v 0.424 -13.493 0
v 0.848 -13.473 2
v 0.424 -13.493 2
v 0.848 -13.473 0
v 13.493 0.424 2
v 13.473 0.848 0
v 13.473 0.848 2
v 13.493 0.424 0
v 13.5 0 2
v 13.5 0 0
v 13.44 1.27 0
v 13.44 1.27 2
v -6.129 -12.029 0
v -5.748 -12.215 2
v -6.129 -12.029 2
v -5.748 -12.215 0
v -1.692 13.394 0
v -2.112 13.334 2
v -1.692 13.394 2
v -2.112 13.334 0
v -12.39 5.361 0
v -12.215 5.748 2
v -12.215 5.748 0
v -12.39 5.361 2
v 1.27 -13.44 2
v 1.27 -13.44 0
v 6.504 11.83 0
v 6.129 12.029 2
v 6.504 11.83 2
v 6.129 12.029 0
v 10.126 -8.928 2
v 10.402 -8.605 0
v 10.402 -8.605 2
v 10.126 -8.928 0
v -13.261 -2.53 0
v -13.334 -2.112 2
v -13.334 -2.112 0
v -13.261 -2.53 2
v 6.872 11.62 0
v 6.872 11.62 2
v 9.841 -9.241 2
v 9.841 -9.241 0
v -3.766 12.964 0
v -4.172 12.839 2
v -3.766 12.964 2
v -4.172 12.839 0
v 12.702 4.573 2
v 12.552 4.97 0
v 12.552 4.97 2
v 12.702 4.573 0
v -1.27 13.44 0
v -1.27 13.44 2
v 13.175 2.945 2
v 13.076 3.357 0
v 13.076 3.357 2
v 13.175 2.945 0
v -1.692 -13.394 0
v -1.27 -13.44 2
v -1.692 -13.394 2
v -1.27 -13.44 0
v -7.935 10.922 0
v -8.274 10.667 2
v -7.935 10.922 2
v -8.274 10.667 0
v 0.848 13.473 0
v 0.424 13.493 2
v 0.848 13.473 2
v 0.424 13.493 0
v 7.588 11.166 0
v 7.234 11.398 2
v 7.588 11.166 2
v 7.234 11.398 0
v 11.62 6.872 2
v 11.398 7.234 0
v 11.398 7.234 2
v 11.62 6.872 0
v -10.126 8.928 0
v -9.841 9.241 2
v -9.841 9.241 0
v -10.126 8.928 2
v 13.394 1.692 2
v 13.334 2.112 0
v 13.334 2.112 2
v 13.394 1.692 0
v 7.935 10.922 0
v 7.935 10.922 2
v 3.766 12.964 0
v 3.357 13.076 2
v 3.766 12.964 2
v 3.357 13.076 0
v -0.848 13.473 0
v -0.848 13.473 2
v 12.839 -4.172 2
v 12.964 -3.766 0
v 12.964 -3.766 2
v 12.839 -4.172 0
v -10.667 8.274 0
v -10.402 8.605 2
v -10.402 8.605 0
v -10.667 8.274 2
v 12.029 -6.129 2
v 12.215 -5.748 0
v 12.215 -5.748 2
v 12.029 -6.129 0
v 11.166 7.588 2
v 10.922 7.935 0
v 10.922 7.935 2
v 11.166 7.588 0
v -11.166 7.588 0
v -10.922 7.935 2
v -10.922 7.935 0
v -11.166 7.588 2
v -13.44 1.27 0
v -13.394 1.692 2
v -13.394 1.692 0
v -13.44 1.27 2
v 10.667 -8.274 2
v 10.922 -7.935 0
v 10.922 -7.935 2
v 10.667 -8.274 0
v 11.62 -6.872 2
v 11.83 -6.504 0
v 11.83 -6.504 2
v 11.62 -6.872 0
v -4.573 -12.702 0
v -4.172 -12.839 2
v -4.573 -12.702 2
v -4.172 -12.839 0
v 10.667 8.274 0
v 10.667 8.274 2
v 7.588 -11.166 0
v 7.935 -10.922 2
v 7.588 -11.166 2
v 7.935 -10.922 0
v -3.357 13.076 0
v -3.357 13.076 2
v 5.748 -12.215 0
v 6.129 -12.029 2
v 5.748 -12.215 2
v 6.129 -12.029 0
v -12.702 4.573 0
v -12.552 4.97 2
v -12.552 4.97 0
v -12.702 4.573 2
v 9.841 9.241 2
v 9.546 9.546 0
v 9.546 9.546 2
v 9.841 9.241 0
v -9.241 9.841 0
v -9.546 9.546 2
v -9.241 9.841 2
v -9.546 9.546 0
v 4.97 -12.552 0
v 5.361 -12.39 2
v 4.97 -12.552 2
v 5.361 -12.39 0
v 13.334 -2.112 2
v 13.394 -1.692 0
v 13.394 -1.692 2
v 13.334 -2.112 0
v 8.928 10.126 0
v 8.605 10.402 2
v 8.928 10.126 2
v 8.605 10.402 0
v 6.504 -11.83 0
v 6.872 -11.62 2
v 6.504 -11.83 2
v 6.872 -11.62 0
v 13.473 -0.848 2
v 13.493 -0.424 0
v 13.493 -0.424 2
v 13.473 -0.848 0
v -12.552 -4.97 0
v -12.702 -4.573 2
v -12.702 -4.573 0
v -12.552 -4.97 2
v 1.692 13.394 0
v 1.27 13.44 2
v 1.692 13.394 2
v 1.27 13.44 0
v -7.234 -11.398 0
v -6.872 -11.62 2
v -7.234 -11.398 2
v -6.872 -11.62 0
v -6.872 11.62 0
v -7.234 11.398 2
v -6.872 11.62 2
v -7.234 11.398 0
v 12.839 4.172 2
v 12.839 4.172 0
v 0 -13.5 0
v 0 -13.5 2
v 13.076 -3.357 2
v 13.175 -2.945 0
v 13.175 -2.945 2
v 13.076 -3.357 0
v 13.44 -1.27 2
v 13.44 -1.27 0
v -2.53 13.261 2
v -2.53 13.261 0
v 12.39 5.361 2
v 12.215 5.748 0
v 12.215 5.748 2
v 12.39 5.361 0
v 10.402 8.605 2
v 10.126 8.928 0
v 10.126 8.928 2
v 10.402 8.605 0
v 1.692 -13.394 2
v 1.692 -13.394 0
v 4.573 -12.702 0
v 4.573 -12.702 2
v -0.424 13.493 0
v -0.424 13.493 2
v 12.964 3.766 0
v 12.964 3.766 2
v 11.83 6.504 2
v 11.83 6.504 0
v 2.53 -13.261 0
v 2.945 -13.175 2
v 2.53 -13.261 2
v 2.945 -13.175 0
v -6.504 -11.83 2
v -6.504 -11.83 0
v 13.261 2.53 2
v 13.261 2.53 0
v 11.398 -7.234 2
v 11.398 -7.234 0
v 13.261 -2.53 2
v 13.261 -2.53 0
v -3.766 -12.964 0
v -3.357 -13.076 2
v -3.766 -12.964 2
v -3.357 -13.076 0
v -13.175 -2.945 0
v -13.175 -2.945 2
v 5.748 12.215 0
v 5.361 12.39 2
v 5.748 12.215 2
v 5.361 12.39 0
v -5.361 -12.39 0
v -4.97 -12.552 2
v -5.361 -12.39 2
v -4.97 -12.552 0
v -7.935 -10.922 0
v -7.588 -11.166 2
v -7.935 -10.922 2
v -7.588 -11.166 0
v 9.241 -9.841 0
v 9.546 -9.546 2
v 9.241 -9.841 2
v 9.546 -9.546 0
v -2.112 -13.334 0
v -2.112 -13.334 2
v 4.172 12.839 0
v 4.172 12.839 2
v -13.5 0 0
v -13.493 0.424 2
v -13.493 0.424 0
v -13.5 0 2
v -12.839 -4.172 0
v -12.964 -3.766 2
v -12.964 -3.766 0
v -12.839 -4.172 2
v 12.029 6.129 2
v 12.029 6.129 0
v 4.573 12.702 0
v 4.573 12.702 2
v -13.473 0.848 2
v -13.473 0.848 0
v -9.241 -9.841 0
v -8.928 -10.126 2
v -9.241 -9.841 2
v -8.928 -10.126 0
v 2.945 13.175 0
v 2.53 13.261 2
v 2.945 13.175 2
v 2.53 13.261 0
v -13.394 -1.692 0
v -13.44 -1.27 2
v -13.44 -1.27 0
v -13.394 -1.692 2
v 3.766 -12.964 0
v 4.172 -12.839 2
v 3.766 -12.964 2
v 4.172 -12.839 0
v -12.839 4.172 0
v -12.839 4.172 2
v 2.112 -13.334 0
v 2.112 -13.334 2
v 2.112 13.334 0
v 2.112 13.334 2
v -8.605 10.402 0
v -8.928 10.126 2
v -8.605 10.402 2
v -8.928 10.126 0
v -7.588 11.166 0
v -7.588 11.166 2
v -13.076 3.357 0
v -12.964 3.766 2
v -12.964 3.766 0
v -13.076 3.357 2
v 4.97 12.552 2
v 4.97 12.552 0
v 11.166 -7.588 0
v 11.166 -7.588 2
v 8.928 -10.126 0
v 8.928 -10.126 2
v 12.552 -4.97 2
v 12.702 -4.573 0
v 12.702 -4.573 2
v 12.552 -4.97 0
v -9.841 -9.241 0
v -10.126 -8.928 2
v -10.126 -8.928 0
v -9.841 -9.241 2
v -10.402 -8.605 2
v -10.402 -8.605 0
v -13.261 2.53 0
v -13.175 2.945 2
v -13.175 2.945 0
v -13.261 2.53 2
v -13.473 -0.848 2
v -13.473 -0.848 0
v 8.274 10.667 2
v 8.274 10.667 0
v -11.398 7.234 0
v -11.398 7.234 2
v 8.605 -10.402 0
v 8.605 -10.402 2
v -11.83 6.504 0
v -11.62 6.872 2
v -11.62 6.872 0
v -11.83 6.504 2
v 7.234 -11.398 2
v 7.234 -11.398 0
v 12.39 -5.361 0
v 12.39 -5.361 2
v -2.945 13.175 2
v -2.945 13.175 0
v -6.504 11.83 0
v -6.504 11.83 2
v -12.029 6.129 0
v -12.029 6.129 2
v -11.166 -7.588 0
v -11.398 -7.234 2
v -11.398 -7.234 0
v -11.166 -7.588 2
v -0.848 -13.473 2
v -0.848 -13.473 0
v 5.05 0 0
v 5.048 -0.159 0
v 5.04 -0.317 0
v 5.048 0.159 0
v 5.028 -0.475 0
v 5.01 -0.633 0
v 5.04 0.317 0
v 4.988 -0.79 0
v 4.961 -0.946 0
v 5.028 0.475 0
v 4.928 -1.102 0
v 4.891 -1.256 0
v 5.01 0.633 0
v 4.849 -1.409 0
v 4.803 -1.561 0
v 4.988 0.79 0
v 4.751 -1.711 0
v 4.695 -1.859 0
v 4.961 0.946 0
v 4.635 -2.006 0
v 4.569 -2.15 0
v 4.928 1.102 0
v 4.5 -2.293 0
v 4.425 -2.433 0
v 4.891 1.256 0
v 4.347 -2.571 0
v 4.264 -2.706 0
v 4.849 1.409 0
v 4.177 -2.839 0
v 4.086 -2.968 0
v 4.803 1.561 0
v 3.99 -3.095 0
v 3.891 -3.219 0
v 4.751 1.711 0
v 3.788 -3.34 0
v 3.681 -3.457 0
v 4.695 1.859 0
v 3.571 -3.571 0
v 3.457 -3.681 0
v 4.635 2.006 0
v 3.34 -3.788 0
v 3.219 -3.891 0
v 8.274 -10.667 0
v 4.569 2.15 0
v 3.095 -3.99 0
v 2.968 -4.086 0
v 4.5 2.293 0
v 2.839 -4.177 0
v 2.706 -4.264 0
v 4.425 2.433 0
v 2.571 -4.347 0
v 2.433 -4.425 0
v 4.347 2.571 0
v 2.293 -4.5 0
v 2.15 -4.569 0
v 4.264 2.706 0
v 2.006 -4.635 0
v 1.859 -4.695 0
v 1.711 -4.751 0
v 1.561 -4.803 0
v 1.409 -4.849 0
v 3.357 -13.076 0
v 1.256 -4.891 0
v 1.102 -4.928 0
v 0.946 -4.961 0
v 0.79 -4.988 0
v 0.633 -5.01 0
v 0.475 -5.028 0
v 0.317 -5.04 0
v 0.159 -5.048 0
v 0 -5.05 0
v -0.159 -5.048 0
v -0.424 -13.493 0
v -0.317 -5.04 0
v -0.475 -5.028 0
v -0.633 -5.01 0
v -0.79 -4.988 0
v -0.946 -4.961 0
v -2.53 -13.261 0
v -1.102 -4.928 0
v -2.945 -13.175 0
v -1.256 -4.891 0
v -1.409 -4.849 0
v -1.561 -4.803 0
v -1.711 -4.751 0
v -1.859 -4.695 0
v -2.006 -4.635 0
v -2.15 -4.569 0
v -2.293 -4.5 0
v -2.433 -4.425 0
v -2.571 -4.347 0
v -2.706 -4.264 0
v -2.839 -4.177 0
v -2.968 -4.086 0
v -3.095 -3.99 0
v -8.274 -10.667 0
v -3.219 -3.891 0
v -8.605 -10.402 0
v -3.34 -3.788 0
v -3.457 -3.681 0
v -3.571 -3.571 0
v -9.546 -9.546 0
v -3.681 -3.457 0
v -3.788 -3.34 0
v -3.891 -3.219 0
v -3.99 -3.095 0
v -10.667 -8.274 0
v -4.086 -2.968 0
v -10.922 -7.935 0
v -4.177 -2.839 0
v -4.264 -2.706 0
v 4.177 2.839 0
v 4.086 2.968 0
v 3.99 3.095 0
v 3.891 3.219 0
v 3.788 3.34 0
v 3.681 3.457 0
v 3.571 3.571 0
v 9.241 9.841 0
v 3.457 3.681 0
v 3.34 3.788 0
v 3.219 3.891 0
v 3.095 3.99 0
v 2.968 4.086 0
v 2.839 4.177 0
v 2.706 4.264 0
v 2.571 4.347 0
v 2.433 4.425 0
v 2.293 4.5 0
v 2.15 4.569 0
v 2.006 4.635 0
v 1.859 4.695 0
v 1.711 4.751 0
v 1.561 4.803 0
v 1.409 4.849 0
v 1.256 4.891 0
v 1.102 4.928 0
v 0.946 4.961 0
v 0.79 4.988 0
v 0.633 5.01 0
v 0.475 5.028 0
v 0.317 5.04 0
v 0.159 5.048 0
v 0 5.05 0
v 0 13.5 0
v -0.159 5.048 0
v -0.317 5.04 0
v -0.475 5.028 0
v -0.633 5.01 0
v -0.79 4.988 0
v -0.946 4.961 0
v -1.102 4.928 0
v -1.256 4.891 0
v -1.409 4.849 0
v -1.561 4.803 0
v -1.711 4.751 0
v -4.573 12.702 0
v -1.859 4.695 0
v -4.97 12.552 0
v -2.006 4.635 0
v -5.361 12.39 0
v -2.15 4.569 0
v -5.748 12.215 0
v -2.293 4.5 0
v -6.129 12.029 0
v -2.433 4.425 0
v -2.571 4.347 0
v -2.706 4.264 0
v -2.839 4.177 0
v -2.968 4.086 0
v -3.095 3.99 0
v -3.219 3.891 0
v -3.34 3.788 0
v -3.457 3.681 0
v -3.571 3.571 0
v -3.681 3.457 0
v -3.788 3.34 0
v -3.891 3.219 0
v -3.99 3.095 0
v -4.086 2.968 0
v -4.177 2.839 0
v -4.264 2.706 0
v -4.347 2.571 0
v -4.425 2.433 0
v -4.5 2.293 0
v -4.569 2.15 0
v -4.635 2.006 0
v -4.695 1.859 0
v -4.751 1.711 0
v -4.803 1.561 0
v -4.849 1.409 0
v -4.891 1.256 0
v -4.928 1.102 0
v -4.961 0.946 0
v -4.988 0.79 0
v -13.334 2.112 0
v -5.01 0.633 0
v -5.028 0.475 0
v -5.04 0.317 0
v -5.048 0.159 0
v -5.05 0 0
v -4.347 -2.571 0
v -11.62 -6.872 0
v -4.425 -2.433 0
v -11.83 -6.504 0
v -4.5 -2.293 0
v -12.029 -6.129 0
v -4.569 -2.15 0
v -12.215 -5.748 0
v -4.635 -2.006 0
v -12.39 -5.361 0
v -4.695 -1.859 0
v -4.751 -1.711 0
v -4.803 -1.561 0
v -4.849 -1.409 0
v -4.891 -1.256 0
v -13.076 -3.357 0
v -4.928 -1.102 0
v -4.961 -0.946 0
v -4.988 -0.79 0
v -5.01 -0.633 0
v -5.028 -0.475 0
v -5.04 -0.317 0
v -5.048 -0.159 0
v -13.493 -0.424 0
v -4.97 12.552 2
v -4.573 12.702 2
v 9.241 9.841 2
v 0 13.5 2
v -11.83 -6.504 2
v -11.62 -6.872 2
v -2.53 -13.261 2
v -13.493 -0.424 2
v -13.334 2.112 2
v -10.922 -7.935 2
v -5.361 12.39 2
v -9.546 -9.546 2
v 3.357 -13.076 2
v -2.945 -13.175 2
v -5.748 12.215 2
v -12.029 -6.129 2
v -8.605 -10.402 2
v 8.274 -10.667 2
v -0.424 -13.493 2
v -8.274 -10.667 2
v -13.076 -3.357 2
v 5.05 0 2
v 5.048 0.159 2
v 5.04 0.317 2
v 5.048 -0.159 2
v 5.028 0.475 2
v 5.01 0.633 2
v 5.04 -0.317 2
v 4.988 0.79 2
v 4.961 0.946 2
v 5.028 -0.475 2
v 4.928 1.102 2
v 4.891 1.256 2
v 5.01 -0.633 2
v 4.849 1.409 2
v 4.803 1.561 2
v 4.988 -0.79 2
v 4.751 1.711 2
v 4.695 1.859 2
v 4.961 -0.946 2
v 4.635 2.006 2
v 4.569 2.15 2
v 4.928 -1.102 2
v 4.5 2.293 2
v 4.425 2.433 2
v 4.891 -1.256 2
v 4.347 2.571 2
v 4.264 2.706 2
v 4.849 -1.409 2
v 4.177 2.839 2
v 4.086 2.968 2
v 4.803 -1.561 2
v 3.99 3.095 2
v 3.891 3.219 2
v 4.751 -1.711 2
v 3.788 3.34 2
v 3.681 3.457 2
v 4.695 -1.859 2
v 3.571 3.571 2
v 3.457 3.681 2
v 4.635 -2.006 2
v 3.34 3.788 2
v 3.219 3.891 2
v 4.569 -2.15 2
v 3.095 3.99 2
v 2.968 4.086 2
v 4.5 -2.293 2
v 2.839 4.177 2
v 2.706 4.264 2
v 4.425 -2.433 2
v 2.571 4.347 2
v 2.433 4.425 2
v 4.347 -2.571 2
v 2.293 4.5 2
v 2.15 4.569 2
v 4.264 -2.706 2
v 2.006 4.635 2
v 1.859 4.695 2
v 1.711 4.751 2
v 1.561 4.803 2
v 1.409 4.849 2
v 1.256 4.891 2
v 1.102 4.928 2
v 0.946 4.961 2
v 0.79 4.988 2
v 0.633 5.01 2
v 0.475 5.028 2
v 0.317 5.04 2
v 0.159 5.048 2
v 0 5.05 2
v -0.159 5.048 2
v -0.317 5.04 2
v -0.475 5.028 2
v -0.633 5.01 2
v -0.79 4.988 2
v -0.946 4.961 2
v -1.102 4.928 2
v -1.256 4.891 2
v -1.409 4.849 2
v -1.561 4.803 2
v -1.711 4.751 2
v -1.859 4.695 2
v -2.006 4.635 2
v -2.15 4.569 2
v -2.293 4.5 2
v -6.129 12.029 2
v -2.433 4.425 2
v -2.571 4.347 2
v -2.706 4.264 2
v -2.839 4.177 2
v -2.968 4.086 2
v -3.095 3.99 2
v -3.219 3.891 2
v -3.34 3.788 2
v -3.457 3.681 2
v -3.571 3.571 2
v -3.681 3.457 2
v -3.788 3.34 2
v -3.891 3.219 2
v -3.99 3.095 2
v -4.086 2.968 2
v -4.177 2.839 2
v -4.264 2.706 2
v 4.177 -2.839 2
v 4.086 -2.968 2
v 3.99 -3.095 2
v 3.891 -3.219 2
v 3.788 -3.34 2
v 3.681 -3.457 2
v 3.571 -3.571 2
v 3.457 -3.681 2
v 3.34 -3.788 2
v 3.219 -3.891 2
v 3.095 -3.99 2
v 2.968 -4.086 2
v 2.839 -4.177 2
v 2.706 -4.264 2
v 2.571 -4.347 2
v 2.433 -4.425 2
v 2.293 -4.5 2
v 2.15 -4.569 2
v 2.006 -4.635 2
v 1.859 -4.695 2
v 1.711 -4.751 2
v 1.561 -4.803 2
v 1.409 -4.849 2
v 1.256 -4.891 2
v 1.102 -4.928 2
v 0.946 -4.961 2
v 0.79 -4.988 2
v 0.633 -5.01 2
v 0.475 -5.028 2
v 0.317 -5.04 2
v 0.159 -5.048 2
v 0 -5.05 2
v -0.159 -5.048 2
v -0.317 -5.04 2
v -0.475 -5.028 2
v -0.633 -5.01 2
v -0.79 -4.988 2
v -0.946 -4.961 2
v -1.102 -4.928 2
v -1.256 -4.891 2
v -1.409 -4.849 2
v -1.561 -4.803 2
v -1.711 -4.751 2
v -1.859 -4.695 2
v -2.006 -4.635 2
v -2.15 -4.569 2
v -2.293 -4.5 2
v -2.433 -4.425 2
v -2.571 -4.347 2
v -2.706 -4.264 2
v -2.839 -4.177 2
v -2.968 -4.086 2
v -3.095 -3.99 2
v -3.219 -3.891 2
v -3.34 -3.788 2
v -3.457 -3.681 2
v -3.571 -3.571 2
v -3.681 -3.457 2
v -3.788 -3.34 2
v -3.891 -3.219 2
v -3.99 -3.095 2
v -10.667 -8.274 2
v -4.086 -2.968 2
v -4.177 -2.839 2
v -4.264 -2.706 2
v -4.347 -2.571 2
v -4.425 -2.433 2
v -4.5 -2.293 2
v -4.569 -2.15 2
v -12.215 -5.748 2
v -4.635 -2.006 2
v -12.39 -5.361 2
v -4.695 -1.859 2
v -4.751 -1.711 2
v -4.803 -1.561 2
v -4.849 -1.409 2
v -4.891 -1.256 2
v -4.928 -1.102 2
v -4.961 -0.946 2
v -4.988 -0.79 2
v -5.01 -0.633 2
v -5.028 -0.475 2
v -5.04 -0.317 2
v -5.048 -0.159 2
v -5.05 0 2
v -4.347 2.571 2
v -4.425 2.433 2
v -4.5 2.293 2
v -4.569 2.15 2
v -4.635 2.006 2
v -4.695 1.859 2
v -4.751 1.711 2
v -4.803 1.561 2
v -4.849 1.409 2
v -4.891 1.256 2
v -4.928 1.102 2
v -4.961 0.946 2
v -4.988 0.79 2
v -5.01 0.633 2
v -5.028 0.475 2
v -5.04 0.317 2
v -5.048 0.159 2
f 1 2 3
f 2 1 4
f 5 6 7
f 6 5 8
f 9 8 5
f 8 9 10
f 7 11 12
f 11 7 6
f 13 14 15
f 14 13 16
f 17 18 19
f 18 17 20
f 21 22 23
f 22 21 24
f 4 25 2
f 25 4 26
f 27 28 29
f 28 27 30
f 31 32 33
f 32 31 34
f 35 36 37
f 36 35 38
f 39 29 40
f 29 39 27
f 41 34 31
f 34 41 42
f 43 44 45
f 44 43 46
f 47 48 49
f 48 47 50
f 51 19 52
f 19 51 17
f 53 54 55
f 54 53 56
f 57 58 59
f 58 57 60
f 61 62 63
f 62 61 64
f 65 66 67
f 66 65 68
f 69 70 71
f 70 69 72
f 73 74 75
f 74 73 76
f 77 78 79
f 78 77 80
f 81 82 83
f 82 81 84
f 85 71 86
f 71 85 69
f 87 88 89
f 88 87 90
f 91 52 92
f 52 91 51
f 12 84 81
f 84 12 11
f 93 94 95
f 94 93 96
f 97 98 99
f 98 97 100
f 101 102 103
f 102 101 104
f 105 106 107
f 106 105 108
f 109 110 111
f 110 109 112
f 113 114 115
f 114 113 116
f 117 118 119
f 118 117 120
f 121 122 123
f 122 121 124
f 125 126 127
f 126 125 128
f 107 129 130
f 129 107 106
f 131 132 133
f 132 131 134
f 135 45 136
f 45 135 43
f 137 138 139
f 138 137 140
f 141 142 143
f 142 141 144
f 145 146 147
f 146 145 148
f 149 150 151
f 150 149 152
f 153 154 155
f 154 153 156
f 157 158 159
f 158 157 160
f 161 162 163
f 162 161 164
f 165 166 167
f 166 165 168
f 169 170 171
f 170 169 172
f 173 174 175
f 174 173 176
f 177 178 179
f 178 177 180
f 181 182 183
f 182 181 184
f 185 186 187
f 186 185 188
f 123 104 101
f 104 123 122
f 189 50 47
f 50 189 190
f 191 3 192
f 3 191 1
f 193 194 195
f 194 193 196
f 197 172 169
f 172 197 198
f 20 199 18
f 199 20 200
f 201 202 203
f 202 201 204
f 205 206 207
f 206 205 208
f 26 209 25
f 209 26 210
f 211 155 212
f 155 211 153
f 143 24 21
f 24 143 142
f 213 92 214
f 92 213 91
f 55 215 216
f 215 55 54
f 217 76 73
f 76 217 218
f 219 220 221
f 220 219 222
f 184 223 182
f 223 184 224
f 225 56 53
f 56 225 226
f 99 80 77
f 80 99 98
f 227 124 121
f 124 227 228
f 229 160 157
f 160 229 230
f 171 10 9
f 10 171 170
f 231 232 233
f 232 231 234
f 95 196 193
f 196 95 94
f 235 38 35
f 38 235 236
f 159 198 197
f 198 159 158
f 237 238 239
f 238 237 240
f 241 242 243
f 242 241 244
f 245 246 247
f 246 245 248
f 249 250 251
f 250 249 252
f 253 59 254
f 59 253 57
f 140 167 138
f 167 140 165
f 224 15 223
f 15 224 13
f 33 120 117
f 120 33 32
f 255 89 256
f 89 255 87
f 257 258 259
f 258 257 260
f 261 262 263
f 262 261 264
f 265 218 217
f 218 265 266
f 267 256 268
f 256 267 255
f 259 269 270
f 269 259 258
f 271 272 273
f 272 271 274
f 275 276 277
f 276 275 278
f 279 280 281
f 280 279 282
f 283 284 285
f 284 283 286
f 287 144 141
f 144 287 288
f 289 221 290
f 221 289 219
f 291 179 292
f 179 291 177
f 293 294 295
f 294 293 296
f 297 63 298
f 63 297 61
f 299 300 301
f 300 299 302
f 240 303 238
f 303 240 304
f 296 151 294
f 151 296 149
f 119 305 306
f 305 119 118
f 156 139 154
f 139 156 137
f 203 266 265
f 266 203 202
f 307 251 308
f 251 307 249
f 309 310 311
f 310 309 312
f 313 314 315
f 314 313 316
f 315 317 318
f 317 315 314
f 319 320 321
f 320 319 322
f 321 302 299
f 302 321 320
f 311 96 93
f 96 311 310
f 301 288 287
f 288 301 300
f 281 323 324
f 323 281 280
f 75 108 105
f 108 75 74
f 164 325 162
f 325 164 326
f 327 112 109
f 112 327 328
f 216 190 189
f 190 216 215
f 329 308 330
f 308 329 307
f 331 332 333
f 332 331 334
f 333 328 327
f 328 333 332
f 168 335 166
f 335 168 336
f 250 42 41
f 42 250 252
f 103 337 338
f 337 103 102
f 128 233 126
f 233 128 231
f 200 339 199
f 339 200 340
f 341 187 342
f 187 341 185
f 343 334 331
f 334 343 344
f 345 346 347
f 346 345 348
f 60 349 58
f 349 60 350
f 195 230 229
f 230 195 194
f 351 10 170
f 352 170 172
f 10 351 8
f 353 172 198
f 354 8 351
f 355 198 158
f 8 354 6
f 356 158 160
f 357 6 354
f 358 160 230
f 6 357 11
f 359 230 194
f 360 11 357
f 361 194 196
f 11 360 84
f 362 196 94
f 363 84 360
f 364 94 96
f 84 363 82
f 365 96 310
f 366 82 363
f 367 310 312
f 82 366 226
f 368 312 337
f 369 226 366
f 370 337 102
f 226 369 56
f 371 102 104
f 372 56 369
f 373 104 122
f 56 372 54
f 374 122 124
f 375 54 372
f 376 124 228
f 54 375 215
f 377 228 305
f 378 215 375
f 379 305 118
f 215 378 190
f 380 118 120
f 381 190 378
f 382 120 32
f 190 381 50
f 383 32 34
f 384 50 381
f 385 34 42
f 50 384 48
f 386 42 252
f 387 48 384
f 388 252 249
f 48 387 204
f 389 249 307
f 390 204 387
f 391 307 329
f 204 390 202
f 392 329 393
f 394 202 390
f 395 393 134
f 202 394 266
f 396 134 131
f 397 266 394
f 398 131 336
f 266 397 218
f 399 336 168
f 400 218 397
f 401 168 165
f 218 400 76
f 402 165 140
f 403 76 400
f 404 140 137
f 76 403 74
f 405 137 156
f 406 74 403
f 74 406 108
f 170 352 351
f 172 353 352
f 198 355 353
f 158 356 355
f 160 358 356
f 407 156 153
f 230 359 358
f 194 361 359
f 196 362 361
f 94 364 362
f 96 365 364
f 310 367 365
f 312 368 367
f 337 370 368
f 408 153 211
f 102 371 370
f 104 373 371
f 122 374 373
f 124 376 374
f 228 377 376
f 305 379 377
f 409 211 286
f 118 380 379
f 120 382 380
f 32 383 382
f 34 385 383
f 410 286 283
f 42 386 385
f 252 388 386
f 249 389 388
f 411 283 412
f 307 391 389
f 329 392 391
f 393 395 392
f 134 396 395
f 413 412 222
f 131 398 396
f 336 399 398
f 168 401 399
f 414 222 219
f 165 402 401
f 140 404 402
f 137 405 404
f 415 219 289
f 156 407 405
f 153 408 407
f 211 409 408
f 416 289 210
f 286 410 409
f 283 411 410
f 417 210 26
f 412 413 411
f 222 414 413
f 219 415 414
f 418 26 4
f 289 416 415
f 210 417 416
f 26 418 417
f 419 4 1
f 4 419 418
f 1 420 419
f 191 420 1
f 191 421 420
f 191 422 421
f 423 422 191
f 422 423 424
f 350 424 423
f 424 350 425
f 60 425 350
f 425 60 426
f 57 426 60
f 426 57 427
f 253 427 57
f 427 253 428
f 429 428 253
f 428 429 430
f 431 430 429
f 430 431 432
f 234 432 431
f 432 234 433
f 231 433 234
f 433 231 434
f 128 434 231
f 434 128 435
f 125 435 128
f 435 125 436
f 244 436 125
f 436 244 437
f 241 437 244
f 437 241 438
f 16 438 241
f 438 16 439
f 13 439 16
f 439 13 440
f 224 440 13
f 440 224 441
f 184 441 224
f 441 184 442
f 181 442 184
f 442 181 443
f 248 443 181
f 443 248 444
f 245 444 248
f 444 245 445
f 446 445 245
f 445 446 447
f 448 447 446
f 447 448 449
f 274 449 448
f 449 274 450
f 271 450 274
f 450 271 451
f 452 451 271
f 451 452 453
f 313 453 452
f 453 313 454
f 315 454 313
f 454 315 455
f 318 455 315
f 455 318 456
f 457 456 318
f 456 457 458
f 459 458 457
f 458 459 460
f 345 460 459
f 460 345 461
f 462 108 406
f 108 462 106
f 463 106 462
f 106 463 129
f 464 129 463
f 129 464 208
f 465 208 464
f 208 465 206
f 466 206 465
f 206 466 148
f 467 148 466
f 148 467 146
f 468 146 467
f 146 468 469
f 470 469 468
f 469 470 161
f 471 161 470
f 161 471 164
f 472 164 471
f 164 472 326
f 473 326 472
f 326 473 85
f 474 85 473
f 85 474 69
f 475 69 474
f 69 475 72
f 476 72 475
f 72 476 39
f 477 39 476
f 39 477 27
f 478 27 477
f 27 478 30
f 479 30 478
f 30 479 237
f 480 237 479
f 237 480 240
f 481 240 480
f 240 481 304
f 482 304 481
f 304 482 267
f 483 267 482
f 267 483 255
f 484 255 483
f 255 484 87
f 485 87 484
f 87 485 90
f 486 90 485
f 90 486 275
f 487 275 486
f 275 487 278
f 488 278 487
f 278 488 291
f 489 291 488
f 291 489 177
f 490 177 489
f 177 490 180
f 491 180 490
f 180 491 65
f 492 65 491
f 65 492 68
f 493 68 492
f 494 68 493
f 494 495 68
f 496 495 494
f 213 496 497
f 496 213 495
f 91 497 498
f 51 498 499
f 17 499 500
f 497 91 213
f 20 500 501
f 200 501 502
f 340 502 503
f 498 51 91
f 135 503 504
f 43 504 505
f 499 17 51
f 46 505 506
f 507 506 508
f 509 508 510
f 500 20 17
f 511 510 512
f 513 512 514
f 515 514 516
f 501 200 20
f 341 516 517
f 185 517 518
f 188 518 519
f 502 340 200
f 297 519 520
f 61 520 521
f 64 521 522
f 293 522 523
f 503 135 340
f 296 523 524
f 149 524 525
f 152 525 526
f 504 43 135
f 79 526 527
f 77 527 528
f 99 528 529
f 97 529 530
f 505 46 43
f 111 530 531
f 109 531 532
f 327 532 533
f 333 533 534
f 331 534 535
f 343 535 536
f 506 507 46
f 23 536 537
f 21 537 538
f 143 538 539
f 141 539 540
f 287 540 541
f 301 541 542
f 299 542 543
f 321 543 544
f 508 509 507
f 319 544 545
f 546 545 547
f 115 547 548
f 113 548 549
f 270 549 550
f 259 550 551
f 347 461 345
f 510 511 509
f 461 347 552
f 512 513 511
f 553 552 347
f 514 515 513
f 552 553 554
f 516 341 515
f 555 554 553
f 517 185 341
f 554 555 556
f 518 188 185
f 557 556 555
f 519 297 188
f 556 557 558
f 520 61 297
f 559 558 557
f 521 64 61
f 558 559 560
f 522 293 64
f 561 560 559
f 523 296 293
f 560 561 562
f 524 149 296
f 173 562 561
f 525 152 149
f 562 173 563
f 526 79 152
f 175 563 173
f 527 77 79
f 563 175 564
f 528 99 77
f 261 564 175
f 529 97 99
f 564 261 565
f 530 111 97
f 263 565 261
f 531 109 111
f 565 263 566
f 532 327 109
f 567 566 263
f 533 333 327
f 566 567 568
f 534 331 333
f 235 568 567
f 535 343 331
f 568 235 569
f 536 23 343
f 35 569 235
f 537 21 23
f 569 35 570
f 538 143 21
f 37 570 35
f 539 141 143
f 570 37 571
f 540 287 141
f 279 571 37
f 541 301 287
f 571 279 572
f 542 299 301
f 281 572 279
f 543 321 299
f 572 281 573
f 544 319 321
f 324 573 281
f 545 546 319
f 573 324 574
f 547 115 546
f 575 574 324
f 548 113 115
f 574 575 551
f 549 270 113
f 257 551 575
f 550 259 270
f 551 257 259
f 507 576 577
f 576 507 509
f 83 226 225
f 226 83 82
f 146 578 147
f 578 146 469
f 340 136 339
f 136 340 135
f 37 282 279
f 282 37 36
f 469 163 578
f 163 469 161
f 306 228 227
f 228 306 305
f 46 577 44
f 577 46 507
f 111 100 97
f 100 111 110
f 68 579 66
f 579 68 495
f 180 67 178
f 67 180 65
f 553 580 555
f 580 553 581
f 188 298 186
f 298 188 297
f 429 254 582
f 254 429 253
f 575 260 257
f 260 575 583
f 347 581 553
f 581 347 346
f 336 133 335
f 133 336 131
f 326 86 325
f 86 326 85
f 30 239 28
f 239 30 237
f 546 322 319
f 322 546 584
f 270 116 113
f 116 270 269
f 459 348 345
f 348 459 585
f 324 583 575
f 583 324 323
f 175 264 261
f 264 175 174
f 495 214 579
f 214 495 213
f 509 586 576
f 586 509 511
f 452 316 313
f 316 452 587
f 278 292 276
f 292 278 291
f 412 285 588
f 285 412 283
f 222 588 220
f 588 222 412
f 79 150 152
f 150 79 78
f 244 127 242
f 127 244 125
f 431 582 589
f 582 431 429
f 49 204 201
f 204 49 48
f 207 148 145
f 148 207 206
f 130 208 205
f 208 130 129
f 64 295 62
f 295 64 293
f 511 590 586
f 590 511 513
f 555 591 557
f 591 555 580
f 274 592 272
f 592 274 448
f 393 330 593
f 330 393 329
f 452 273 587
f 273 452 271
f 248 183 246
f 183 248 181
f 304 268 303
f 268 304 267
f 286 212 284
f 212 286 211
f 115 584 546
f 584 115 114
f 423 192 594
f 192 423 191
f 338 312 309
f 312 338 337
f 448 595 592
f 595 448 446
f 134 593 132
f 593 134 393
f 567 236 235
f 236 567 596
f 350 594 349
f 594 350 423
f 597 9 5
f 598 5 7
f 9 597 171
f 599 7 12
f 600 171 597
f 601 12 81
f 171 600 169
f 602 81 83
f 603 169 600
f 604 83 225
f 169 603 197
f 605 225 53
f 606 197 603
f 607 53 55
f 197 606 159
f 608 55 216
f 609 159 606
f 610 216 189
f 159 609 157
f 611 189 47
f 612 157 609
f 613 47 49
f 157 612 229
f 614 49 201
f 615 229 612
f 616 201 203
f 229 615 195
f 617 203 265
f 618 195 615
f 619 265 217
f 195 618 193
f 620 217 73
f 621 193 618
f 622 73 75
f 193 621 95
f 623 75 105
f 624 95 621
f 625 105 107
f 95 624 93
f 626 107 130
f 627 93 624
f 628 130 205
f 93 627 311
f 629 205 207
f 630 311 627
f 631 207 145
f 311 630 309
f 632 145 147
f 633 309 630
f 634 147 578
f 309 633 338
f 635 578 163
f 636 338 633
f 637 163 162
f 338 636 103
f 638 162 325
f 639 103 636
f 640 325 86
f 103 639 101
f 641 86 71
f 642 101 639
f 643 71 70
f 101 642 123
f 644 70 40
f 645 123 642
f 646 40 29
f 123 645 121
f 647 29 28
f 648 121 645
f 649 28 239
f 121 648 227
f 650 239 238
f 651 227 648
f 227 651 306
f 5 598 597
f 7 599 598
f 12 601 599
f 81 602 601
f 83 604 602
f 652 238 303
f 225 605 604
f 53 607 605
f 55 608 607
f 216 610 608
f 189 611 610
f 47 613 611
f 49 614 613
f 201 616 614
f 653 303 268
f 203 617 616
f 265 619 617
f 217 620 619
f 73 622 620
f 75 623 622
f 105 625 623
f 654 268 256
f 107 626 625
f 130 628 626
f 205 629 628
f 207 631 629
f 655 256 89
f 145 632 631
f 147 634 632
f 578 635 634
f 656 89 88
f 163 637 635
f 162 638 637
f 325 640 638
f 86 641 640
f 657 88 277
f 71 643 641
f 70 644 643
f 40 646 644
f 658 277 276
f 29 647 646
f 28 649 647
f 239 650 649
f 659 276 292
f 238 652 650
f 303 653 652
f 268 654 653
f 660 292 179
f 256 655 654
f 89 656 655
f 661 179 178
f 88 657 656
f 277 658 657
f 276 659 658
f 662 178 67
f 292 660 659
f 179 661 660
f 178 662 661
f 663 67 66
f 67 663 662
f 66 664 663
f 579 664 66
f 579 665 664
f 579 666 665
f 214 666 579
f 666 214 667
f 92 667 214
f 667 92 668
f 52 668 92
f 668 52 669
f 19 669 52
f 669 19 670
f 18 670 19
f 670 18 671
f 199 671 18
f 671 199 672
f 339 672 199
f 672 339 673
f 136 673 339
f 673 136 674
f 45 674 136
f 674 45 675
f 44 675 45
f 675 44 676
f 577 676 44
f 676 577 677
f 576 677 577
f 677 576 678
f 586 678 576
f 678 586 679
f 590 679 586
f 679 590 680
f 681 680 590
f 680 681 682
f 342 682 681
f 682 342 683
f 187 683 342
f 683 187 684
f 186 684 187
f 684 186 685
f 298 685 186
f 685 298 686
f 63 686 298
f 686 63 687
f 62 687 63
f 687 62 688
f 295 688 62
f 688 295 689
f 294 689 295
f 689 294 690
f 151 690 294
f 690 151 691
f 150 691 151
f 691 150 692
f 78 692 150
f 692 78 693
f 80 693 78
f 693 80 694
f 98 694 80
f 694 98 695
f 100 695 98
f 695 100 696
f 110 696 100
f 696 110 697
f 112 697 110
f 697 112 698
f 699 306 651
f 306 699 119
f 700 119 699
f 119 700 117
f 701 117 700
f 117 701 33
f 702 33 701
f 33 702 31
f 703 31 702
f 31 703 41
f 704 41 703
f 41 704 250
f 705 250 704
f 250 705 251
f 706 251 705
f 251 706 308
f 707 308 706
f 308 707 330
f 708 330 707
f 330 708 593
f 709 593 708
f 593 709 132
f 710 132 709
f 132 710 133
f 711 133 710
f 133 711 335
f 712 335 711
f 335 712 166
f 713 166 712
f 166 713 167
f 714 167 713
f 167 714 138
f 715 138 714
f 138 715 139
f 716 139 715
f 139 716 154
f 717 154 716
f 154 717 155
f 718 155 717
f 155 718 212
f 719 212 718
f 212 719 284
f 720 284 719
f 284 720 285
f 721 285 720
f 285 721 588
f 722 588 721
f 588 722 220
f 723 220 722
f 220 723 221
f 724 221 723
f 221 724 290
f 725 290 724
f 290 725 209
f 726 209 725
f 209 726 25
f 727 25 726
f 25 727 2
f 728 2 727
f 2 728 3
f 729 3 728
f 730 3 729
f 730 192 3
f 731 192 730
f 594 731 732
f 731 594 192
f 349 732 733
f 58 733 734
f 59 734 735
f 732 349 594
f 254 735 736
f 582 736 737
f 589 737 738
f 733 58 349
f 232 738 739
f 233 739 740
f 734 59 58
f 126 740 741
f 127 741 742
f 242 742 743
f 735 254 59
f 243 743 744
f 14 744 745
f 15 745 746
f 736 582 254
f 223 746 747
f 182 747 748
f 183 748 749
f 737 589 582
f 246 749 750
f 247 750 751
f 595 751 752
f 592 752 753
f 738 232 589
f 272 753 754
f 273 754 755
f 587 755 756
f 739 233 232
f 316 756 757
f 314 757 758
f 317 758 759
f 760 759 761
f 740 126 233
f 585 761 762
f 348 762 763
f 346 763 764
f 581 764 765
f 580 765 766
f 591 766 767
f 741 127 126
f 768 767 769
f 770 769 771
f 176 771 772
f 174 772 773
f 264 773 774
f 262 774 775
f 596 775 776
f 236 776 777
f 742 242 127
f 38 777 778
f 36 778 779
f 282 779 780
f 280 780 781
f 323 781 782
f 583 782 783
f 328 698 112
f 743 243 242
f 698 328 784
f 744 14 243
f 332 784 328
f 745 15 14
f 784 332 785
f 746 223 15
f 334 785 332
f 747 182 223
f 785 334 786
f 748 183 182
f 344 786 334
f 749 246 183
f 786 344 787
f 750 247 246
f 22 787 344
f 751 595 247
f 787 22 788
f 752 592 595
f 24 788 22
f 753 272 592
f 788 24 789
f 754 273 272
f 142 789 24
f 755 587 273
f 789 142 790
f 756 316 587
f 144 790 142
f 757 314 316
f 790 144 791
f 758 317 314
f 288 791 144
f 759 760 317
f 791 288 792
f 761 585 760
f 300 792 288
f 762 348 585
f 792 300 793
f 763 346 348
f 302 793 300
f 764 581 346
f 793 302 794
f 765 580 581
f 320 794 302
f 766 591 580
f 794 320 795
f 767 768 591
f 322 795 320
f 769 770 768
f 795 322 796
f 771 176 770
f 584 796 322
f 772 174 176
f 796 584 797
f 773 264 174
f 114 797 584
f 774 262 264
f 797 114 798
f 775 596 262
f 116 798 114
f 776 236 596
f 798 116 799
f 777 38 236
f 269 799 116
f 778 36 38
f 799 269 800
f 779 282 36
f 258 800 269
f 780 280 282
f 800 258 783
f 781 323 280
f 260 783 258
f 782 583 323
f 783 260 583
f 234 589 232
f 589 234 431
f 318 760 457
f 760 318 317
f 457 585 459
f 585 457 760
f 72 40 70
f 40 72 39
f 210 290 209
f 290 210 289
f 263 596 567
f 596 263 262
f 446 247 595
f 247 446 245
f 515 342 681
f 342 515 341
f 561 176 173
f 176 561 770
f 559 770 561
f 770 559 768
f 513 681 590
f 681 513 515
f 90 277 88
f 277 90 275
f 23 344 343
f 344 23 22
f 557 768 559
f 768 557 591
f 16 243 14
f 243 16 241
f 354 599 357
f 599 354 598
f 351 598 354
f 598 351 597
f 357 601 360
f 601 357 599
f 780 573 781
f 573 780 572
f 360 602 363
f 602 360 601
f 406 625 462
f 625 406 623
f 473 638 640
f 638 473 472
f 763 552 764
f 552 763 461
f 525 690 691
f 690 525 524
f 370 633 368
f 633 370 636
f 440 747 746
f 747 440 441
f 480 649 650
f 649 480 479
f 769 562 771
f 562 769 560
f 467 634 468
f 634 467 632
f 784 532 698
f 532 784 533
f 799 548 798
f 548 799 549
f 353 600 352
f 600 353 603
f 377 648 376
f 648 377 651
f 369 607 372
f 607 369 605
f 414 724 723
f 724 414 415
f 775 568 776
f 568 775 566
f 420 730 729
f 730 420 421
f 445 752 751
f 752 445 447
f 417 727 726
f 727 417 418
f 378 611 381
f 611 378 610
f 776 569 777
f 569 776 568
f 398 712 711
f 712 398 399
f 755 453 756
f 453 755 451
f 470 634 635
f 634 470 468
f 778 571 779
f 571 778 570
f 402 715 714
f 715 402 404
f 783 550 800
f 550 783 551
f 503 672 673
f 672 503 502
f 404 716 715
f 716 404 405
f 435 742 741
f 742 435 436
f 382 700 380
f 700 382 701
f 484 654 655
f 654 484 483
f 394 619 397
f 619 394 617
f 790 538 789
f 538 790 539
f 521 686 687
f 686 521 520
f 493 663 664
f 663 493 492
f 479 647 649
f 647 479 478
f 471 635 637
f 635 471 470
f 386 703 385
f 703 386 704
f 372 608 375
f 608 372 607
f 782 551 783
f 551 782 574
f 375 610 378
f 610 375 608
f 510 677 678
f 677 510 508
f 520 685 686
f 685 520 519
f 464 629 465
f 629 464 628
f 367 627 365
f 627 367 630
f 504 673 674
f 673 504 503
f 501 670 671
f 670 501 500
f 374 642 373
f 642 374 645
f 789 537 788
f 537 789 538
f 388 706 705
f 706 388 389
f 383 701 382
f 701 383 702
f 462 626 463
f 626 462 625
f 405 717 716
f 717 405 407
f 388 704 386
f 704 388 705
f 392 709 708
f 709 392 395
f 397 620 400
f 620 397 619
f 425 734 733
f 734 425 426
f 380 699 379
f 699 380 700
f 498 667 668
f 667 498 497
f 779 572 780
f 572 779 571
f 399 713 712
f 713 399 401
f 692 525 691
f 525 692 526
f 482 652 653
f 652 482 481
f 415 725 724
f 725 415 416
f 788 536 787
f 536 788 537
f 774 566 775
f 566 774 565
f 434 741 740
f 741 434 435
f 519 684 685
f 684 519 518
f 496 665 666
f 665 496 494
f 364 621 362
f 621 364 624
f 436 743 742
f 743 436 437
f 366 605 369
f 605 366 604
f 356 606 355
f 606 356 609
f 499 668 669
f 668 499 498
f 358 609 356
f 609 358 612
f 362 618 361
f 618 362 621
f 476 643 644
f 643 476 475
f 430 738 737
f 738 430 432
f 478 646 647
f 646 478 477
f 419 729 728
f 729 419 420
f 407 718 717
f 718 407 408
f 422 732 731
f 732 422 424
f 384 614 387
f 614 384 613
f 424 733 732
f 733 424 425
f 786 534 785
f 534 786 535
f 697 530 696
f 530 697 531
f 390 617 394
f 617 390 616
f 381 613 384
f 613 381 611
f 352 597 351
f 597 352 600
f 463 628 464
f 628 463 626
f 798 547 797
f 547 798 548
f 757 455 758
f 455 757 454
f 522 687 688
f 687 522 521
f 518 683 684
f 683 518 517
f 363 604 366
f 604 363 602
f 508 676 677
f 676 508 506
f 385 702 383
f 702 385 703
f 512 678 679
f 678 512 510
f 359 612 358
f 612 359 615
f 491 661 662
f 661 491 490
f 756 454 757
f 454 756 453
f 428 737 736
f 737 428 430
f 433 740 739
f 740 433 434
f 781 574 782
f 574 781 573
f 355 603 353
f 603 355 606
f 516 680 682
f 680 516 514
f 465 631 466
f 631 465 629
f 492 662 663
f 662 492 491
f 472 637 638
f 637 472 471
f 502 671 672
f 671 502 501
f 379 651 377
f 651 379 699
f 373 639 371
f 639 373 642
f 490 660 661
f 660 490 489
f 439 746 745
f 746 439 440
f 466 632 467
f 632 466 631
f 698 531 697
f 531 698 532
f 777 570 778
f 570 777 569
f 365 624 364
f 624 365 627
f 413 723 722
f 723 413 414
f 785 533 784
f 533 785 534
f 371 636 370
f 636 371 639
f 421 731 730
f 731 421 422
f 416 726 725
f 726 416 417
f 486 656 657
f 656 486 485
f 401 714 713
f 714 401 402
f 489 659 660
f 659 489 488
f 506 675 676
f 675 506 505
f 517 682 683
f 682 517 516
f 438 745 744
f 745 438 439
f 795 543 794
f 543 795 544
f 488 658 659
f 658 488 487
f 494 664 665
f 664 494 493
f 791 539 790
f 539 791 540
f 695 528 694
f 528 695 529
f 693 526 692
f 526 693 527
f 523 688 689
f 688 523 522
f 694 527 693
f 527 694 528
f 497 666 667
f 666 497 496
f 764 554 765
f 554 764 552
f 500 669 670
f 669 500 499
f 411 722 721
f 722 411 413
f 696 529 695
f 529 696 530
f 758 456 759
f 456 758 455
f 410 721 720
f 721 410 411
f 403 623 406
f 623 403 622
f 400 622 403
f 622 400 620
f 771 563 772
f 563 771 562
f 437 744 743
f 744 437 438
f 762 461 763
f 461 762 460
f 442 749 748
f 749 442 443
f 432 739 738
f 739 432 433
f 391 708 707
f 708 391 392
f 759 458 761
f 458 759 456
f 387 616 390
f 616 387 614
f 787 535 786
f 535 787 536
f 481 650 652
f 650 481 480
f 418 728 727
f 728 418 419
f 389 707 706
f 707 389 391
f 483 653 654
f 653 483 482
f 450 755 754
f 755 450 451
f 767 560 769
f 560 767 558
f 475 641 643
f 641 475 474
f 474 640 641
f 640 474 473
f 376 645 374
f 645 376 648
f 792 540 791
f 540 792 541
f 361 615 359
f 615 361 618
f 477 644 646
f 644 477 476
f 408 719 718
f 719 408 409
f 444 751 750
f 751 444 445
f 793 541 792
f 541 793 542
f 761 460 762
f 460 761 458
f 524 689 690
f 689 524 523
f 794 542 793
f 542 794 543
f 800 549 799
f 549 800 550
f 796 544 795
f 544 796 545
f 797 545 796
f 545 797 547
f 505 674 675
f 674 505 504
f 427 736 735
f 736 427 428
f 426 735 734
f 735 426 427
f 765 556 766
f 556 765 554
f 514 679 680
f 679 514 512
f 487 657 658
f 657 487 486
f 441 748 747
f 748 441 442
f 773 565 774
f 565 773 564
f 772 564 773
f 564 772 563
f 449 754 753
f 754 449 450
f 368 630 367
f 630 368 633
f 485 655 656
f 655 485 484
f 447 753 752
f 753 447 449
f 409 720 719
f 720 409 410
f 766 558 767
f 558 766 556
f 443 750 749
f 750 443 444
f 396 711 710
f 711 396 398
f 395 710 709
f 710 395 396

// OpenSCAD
$fn=200;
ring();
module ring(){
    difference(){
        cylinder(h=2,d=27);
        cylinder(h=5,d=10.1, center=true);
    };
}
